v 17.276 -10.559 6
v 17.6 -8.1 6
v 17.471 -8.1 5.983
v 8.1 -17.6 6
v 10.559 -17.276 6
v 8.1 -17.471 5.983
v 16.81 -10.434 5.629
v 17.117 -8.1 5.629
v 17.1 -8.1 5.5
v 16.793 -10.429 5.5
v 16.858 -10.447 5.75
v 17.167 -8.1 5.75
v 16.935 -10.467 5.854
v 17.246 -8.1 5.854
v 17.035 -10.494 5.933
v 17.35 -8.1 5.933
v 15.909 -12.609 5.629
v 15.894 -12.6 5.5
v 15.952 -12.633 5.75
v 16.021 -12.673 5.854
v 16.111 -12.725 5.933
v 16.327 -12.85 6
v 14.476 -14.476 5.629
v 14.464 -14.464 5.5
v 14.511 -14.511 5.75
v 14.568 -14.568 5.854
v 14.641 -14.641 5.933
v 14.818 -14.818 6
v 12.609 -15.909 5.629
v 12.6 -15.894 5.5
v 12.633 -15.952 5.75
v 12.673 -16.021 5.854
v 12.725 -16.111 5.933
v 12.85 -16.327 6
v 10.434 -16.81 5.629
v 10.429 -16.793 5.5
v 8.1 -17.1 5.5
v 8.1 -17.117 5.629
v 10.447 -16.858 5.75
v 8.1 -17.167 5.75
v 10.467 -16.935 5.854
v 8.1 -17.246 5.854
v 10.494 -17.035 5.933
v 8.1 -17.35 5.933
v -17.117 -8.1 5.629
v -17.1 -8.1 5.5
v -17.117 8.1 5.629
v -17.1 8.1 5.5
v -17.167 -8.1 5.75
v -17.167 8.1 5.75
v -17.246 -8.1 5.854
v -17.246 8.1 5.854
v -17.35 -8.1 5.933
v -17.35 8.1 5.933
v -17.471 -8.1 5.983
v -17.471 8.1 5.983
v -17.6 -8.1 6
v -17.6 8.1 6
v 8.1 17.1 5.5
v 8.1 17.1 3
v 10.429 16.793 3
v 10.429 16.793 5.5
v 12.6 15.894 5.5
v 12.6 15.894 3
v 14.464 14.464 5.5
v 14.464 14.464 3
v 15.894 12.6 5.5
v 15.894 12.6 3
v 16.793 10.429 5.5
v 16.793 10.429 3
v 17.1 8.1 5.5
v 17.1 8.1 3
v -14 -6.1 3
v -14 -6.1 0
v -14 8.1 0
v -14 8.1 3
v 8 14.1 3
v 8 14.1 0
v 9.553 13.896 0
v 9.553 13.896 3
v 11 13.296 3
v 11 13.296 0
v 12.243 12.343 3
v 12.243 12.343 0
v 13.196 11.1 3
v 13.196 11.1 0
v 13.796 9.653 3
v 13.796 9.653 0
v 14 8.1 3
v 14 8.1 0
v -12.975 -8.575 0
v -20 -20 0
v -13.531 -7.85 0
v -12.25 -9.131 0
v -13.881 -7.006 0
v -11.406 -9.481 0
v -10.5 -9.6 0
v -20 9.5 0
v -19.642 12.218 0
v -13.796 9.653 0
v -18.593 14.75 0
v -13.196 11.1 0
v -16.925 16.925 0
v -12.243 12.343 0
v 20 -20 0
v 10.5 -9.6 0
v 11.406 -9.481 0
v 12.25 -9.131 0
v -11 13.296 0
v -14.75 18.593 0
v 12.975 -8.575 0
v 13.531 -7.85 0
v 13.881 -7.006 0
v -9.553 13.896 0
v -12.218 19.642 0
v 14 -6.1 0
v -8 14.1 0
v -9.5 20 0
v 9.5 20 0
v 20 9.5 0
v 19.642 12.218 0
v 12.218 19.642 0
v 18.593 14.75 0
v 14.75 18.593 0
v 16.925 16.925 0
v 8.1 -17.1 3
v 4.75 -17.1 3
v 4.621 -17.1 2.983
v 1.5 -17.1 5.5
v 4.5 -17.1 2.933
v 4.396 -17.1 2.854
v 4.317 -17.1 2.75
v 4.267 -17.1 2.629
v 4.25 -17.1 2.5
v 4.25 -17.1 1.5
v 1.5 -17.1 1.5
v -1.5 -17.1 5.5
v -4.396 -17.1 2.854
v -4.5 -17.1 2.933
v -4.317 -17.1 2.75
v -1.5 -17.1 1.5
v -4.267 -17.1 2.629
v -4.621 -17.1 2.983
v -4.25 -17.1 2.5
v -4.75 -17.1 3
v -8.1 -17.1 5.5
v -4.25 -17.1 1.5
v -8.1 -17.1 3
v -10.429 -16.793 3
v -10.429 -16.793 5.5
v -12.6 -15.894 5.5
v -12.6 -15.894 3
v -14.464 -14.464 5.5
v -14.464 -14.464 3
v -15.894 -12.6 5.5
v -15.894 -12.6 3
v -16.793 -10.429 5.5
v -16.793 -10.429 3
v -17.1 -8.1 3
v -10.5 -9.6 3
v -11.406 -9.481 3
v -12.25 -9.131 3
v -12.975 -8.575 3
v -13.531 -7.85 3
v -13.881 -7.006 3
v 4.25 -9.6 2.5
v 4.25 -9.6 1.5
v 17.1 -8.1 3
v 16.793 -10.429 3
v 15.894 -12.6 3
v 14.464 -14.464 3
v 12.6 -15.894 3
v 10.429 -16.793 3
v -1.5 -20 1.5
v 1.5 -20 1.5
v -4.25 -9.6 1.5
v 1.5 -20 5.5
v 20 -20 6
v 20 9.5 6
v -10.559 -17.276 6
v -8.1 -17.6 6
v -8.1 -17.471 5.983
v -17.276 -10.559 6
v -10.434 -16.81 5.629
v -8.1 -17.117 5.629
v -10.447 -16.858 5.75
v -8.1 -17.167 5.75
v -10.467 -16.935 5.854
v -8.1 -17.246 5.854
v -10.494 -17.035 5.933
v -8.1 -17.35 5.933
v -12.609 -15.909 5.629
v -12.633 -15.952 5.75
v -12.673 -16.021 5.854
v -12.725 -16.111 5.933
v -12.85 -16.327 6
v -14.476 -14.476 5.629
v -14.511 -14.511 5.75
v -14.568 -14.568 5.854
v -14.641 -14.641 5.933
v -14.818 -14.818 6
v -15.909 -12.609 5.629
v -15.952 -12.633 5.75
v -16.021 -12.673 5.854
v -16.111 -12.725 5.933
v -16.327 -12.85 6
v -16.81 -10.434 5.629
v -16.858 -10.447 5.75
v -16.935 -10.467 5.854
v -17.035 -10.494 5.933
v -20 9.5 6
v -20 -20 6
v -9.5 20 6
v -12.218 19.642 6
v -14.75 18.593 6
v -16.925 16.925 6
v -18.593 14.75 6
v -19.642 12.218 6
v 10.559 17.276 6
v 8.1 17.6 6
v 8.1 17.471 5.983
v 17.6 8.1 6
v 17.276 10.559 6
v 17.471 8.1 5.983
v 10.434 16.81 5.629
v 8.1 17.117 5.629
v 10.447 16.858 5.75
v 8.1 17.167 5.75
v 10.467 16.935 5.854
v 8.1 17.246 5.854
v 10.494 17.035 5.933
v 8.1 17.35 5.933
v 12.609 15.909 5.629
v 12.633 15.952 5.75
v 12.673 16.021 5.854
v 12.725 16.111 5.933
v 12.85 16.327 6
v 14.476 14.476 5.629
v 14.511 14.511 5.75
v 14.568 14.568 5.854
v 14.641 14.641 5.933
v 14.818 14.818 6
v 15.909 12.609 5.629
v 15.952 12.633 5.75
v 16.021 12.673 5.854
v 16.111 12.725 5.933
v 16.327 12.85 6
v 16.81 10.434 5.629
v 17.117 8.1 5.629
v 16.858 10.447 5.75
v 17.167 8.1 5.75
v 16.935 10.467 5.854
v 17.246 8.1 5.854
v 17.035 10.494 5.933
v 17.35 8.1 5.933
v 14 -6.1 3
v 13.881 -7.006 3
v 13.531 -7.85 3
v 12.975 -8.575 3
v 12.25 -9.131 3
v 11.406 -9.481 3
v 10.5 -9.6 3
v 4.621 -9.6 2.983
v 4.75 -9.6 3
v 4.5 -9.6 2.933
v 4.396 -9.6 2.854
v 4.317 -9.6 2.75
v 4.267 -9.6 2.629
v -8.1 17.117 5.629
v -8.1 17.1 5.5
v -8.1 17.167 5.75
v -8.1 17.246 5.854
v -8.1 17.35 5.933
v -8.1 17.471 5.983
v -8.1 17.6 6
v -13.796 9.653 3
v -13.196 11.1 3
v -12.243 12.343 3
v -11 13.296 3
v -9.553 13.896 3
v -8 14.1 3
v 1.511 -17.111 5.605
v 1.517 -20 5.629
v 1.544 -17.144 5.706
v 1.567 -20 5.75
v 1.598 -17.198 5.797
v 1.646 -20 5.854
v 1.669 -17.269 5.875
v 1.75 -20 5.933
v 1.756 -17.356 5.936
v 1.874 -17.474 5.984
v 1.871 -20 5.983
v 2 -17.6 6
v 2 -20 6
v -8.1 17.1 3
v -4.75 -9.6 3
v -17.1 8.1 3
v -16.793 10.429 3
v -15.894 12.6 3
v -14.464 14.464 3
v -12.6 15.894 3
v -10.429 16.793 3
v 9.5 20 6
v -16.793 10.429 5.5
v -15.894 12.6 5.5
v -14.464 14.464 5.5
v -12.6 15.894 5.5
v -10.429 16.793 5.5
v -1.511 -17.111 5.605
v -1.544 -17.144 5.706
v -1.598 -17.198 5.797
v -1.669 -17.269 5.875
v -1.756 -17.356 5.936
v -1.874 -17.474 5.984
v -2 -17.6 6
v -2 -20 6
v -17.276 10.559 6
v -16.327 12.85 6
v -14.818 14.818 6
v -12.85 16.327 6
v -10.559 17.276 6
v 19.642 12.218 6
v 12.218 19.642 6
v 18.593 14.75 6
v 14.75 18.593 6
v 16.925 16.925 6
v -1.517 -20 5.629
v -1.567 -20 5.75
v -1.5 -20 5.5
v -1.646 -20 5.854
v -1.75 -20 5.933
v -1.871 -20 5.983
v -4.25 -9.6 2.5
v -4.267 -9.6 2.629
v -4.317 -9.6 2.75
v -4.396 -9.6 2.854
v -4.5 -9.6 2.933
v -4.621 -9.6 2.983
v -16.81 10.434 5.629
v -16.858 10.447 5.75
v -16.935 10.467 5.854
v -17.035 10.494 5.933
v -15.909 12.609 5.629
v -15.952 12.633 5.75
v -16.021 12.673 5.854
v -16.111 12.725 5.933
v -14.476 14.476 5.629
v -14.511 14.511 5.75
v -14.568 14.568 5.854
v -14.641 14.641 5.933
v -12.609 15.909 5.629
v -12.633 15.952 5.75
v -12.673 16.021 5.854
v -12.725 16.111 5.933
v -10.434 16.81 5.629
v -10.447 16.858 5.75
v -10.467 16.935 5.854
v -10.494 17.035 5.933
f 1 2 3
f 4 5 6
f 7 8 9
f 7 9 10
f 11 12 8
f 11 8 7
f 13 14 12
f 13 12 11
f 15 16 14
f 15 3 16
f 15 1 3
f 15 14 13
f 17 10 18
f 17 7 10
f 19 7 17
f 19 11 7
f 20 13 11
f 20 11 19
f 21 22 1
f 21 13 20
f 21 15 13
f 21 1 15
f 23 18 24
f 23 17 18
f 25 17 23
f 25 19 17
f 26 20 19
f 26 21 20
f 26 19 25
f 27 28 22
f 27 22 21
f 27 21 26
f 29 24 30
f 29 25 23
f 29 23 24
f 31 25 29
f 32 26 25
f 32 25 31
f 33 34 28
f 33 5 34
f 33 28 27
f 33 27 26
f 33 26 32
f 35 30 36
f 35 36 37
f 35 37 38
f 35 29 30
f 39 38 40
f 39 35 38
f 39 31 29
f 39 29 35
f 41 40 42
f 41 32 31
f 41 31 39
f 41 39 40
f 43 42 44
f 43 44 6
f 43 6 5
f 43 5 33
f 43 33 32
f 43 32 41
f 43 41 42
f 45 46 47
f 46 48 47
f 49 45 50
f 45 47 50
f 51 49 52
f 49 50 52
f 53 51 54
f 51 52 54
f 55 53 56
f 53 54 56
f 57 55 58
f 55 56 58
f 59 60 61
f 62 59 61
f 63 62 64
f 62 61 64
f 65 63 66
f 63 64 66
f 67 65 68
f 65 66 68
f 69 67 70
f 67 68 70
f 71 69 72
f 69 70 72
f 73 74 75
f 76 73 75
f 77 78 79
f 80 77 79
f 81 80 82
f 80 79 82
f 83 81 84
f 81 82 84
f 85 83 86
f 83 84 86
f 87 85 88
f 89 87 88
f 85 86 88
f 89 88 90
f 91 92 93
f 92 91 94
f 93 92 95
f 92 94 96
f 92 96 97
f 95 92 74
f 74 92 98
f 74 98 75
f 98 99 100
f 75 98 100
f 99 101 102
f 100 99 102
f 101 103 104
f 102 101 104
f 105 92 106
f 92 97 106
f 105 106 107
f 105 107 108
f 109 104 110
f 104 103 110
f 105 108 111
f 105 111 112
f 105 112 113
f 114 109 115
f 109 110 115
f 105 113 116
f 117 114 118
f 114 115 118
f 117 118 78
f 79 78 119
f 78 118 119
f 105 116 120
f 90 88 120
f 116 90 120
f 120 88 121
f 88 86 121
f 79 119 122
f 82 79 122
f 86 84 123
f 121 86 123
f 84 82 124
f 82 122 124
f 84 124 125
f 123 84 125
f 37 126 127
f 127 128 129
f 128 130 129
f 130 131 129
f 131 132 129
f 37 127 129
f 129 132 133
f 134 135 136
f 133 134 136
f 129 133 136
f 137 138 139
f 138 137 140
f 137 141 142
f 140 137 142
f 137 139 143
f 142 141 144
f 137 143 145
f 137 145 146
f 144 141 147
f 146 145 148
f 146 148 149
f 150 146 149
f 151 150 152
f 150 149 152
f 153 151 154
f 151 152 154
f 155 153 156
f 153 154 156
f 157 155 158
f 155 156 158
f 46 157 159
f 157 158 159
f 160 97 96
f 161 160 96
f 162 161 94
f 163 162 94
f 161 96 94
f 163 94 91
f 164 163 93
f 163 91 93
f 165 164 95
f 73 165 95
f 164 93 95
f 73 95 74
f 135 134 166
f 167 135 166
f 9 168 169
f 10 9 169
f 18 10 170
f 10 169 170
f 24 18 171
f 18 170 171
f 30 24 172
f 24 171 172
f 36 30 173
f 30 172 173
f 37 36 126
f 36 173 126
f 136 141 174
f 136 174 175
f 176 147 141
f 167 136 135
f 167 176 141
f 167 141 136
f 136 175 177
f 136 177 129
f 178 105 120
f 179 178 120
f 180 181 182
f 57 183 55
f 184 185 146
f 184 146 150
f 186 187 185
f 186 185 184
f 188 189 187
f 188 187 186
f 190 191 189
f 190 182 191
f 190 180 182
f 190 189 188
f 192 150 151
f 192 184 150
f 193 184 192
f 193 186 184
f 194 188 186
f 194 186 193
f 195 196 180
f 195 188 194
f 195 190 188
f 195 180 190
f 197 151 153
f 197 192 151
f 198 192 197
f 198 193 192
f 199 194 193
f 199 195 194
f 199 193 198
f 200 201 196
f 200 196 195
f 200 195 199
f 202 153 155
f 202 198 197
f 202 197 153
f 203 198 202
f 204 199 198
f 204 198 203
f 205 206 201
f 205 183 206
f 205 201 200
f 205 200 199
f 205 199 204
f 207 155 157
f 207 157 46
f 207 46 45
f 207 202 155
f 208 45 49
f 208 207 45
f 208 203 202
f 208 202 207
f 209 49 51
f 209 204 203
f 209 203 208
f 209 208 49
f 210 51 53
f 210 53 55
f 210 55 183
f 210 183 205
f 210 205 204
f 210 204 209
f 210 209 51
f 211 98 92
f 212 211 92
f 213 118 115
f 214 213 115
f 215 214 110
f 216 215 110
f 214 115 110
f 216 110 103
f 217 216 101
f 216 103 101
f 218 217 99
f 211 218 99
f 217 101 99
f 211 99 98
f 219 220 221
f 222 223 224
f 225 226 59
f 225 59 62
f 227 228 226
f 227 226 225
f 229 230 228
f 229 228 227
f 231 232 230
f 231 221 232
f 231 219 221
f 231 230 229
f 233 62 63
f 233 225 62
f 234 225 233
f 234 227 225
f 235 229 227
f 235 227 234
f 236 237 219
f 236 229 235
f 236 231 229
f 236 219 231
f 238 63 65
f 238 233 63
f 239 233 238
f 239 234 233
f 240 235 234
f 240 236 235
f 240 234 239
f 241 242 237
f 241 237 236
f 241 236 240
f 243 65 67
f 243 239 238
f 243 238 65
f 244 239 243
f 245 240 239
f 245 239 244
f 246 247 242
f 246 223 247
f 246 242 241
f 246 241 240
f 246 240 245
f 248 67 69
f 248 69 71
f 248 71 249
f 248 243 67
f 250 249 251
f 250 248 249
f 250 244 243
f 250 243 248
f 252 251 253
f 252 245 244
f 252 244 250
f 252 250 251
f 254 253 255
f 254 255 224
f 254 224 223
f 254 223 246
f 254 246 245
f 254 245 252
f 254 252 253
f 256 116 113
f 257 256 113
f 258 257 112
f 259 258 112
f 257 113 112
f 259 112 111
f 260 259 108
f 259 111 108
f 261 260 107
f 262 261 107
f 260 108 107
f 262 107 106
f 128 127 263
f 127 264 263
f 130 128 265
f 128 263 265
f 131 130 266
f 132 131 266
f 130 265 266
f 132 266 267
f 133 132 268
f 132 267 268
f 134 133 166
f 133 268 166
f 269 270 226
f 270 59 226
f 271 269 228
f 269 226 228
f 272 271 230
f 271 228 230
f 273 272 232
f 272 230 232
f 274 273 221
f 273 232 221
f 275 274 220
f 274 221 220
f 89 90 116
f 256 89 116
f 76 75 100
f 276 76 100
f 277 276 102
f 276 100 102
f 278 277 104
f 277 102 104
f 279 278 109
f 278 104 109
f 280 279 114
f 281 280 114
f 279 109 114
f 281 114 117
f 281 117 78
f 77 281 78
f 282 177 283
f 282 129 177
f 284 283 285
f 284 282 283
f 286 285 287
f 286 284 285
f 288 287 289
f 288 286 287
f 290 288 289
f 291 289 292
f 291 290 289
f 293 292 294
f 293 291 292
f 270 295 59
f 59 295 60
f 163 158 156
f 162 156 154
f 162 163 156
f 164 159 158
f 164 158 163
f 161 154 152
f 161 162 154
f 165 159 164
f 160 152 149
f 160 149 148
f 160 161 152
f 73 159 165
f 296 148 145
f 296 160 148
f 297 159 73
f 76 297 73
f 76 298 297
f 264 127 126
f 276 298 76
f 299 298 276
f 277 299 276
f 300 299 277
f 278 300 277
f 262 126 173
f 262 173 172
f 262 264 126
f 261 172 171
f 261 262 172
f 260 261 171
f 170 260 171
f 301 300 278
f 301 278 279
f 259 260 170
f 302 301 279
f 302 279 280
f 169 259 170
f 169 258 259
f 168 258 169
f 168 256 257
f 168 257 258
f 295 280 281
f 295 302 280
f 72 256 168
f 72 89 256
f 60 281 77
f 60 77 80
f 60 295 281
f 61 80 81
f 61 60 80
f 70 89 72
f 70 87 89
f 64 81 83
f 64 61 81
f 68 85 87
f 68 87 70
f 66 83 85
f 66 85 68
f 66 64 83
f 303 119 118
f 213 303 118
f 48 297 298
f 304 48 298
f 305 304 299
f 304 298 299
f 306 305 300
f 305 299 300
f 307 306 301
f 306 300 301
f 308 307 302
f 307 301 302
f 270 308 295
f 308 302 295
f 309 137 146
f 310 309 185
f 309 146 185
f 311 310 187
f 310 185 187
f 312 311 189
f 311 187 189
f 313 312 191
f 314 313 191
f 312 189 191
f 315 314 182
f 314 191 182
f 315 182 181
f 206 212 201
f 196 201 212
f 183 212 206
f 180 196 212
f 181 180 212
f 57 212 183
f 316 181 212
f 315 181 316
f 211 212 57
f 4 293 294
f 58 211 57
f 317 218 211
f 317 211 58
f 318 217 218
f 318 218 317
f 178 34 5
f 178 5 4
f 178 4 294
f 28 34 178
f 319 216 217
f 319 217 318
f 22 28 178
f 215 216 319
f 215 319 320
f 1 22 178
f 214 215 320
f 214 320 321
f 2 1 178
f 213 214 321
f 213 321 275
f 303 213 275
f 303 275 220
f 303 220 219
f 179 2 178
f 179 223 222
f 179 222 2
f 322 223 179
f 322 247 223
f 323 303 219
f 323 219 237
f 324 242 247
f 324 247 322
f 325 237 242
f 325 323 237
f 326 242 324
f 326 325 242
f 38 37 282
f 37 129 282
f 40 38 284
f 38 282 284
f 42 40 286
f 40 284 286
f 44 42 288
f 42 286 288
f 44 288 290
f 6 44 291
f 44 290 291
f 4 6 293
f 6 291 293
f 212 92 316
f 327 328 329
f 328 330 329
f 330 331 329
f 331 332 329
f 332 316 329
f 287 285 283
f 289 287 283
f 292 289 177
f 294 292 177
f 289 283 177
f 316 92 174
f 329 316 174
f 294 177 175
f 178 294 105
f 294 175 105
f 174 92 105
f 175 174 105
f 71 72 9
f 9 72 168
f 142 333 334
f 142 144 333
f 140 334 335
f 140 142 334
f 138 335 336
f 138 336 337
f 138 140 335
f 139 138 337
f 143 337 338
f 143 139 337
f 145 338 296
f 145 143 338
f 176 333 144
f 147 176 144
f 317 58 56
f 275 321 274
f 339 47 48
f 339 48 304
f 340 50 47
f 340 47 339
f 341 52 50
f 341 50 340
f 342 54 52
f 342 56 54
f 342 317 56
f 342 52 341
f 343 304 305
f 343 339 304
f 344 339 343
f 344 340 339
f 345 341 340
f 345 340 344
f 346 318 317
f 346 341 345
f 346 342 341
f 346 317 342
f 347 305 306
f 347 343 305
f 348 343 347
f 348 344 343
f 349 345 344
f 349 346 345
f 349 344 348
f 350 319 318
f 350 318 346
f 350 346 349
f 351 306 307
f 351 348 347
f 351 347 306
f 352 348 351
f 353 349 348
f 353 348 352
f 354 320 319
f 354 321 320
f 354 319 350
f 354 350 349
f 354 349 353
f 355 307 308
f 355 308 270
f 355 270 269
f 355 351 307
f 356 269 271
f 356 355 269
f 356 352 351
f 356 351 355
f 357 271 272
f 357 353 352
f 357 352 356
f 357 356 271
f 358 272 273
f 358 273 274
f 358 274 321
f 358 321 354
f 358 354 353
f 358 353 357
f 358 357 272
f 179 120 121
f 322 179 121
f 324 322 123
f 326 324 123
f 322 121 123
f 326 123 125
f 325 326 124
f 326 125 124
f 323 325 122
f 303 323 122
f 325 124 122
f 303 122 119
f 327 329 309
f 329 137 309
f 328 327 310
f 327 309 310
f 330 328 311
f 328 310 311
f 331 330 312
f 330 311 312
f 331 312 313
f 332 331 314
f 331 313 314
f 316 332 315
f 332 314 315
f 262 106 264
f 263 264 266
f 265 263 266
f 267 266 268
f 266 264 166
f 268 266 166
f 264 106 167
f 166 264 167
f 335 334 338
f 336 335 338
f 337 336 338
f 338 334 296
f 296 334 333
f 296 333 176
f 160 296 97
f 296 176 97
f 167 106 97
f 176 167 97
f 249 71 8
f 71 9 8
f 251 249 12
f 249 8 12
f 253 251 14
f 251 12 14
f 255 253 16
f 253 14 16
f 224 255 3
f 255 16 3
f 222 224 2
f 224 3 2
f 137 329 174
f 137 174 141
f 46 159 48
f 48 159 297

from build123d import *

# Parameters (mm, degrees)
F1_DEPTH = 3
F2_DEPTH = 6
F3_W     = 3
F3_H     = 2.9
F4_DEPTH = 1.5
F5_DEPTH = 3
F6_R     = 0.5


with BuildPart() as f1:
    # F0 (on Top) → F1 (new body)
    with BuildSketch(Plane.XY):
        with BuildLine():
            Line((-8.1, -17.1), (8.1, -17.1))
            ThreePointArc((8.1, -17.1), (14.463961, -14.463961), (17.1, -8.1))
            Line((17.1, -8.1), (17.1, 8.1))
            ThreePointArc((17.1, 8.1), (14.463961, 14.463961), (8.1, 17.1))
            Line((8.1, 17.1), (-8.1, 17.1))
            ThreePointArc((-8.1, 17.1), (-14.463961, 14.463961), (-17.1, 8.1))
            Line((-17.1, 8.1), (-17.1, -8.1))
            ThreePointArc((-17.1, -8.1), (-14.463961, -14.463961), (-8.1, -17.1))
        make_face()
        with BuildLine():
            ThreePointArc((14, -6.1), (12.974874, -8.574874), (10.5, -9.6))
            Line((10.5, -9.6), (-10.5, -9.6))
            ThreePointArc((-10.5, -9.6), (-12.974874, -8.574874), (-14, -6.1))
            Line((-14, -6.1), (-14, 0))
            Line((-14, 0), (-14, 8.1))
            ThreePointArc((-14, 8.1), (-12.242641, 12.342641), (-8, 14.1))
            Line((-8, 14.1), (8, 14.1))
            ThreePointArc((8, 14.1), (12.242641, 12.342641), (14, 8.1))
            Line((14, 8.1), (14, 0))
            Line((14, 0), (14, -6.1))
        make_face(mode=Mode.SUBTRACT)
    extrude(amount=F1_DEPTH)

    # F0 (on Top) → F2 (join)
    with BuildSketch(Plane.XY):
        with BuildLine():
            Line((-20, -20), (20, -20))
            Line((20, -20), (20, 9.5))
            ThreePointArc((20, 9.5), (16.924621, 16.924621), (9.5, 20))
            Line((9.5, 20), (-9.5, 20))
            ThreePointArc((-9.5, 20), (-16.924621, 16.924621), (-20, 9.5))
            Line((-20, 9.5), (-20, -20))
        make_face()
        with BuildLine():
            ThreePointArc((17.1, -8.1), (14.463961, -14.463961), (8.1, -17.1))
            Line((8.1, -17.1), (-8.1, -17.1))
            ThreePointArc((-8.1, -17.1), (-14.463961, -14.463961), (-17.1, -8.1))
            Line((-17.1, -8.1), (-17.1, 8.1))
            ThreePointArc((-17.1, 8.1), (-14.463961, 14.463961), (-8.1, 17.1))
            Line((-8.1, 17.1), (8.1, 17.1))
            ThreePointArc((8.1, 17.1), (14.463961, 14.463961), (17.1, 8.1))
            Line((17.1, 8.1), (17.1, -8.1))
        make_face(mode=Mode.SUBTRACT)
    extrude(amount=F2_DEPTH)

    # F3 (on face) → F4 (cut)
    with BuildSketch(Plane.XY.offset(3)):
        Polygon((1.5, -17.1), (4.25, -17.1), (4.25, -9.6), (-4.25, -9.6), (-4.25, -17.1), (-1.5, -17.1), align=None)
        with Locations((0, -18.55)):
            Rectangle(F3_W, F3_H)
    extrude(amount=-F4_DEPTH, mode=Mode.SUBTRACT)

    # F3 (on face) → F5 (cut, through all)
    with BuildSketch(Plane.XY.offset(3)):
        with Locations((0, -18.55)):
            Rectangle(F3_W, F3_H)
    extrude(amount=F5_DEPTH, mode=Mode.SUBTRACT)

    # F6
    f6_edges = [f1.edges().sort_by_distance(p)[0] for p in [
        (-14.463961, 14.463961, 6),
        (-1.5, -18.55, 6),
        (1.5, -18.55, 6),
        (-4.25, -13.35, 3),
        (4.25, -13.35, 3),
    ]]
    fillet(f6_edges, radius=F6_R)


solid = f1.part
